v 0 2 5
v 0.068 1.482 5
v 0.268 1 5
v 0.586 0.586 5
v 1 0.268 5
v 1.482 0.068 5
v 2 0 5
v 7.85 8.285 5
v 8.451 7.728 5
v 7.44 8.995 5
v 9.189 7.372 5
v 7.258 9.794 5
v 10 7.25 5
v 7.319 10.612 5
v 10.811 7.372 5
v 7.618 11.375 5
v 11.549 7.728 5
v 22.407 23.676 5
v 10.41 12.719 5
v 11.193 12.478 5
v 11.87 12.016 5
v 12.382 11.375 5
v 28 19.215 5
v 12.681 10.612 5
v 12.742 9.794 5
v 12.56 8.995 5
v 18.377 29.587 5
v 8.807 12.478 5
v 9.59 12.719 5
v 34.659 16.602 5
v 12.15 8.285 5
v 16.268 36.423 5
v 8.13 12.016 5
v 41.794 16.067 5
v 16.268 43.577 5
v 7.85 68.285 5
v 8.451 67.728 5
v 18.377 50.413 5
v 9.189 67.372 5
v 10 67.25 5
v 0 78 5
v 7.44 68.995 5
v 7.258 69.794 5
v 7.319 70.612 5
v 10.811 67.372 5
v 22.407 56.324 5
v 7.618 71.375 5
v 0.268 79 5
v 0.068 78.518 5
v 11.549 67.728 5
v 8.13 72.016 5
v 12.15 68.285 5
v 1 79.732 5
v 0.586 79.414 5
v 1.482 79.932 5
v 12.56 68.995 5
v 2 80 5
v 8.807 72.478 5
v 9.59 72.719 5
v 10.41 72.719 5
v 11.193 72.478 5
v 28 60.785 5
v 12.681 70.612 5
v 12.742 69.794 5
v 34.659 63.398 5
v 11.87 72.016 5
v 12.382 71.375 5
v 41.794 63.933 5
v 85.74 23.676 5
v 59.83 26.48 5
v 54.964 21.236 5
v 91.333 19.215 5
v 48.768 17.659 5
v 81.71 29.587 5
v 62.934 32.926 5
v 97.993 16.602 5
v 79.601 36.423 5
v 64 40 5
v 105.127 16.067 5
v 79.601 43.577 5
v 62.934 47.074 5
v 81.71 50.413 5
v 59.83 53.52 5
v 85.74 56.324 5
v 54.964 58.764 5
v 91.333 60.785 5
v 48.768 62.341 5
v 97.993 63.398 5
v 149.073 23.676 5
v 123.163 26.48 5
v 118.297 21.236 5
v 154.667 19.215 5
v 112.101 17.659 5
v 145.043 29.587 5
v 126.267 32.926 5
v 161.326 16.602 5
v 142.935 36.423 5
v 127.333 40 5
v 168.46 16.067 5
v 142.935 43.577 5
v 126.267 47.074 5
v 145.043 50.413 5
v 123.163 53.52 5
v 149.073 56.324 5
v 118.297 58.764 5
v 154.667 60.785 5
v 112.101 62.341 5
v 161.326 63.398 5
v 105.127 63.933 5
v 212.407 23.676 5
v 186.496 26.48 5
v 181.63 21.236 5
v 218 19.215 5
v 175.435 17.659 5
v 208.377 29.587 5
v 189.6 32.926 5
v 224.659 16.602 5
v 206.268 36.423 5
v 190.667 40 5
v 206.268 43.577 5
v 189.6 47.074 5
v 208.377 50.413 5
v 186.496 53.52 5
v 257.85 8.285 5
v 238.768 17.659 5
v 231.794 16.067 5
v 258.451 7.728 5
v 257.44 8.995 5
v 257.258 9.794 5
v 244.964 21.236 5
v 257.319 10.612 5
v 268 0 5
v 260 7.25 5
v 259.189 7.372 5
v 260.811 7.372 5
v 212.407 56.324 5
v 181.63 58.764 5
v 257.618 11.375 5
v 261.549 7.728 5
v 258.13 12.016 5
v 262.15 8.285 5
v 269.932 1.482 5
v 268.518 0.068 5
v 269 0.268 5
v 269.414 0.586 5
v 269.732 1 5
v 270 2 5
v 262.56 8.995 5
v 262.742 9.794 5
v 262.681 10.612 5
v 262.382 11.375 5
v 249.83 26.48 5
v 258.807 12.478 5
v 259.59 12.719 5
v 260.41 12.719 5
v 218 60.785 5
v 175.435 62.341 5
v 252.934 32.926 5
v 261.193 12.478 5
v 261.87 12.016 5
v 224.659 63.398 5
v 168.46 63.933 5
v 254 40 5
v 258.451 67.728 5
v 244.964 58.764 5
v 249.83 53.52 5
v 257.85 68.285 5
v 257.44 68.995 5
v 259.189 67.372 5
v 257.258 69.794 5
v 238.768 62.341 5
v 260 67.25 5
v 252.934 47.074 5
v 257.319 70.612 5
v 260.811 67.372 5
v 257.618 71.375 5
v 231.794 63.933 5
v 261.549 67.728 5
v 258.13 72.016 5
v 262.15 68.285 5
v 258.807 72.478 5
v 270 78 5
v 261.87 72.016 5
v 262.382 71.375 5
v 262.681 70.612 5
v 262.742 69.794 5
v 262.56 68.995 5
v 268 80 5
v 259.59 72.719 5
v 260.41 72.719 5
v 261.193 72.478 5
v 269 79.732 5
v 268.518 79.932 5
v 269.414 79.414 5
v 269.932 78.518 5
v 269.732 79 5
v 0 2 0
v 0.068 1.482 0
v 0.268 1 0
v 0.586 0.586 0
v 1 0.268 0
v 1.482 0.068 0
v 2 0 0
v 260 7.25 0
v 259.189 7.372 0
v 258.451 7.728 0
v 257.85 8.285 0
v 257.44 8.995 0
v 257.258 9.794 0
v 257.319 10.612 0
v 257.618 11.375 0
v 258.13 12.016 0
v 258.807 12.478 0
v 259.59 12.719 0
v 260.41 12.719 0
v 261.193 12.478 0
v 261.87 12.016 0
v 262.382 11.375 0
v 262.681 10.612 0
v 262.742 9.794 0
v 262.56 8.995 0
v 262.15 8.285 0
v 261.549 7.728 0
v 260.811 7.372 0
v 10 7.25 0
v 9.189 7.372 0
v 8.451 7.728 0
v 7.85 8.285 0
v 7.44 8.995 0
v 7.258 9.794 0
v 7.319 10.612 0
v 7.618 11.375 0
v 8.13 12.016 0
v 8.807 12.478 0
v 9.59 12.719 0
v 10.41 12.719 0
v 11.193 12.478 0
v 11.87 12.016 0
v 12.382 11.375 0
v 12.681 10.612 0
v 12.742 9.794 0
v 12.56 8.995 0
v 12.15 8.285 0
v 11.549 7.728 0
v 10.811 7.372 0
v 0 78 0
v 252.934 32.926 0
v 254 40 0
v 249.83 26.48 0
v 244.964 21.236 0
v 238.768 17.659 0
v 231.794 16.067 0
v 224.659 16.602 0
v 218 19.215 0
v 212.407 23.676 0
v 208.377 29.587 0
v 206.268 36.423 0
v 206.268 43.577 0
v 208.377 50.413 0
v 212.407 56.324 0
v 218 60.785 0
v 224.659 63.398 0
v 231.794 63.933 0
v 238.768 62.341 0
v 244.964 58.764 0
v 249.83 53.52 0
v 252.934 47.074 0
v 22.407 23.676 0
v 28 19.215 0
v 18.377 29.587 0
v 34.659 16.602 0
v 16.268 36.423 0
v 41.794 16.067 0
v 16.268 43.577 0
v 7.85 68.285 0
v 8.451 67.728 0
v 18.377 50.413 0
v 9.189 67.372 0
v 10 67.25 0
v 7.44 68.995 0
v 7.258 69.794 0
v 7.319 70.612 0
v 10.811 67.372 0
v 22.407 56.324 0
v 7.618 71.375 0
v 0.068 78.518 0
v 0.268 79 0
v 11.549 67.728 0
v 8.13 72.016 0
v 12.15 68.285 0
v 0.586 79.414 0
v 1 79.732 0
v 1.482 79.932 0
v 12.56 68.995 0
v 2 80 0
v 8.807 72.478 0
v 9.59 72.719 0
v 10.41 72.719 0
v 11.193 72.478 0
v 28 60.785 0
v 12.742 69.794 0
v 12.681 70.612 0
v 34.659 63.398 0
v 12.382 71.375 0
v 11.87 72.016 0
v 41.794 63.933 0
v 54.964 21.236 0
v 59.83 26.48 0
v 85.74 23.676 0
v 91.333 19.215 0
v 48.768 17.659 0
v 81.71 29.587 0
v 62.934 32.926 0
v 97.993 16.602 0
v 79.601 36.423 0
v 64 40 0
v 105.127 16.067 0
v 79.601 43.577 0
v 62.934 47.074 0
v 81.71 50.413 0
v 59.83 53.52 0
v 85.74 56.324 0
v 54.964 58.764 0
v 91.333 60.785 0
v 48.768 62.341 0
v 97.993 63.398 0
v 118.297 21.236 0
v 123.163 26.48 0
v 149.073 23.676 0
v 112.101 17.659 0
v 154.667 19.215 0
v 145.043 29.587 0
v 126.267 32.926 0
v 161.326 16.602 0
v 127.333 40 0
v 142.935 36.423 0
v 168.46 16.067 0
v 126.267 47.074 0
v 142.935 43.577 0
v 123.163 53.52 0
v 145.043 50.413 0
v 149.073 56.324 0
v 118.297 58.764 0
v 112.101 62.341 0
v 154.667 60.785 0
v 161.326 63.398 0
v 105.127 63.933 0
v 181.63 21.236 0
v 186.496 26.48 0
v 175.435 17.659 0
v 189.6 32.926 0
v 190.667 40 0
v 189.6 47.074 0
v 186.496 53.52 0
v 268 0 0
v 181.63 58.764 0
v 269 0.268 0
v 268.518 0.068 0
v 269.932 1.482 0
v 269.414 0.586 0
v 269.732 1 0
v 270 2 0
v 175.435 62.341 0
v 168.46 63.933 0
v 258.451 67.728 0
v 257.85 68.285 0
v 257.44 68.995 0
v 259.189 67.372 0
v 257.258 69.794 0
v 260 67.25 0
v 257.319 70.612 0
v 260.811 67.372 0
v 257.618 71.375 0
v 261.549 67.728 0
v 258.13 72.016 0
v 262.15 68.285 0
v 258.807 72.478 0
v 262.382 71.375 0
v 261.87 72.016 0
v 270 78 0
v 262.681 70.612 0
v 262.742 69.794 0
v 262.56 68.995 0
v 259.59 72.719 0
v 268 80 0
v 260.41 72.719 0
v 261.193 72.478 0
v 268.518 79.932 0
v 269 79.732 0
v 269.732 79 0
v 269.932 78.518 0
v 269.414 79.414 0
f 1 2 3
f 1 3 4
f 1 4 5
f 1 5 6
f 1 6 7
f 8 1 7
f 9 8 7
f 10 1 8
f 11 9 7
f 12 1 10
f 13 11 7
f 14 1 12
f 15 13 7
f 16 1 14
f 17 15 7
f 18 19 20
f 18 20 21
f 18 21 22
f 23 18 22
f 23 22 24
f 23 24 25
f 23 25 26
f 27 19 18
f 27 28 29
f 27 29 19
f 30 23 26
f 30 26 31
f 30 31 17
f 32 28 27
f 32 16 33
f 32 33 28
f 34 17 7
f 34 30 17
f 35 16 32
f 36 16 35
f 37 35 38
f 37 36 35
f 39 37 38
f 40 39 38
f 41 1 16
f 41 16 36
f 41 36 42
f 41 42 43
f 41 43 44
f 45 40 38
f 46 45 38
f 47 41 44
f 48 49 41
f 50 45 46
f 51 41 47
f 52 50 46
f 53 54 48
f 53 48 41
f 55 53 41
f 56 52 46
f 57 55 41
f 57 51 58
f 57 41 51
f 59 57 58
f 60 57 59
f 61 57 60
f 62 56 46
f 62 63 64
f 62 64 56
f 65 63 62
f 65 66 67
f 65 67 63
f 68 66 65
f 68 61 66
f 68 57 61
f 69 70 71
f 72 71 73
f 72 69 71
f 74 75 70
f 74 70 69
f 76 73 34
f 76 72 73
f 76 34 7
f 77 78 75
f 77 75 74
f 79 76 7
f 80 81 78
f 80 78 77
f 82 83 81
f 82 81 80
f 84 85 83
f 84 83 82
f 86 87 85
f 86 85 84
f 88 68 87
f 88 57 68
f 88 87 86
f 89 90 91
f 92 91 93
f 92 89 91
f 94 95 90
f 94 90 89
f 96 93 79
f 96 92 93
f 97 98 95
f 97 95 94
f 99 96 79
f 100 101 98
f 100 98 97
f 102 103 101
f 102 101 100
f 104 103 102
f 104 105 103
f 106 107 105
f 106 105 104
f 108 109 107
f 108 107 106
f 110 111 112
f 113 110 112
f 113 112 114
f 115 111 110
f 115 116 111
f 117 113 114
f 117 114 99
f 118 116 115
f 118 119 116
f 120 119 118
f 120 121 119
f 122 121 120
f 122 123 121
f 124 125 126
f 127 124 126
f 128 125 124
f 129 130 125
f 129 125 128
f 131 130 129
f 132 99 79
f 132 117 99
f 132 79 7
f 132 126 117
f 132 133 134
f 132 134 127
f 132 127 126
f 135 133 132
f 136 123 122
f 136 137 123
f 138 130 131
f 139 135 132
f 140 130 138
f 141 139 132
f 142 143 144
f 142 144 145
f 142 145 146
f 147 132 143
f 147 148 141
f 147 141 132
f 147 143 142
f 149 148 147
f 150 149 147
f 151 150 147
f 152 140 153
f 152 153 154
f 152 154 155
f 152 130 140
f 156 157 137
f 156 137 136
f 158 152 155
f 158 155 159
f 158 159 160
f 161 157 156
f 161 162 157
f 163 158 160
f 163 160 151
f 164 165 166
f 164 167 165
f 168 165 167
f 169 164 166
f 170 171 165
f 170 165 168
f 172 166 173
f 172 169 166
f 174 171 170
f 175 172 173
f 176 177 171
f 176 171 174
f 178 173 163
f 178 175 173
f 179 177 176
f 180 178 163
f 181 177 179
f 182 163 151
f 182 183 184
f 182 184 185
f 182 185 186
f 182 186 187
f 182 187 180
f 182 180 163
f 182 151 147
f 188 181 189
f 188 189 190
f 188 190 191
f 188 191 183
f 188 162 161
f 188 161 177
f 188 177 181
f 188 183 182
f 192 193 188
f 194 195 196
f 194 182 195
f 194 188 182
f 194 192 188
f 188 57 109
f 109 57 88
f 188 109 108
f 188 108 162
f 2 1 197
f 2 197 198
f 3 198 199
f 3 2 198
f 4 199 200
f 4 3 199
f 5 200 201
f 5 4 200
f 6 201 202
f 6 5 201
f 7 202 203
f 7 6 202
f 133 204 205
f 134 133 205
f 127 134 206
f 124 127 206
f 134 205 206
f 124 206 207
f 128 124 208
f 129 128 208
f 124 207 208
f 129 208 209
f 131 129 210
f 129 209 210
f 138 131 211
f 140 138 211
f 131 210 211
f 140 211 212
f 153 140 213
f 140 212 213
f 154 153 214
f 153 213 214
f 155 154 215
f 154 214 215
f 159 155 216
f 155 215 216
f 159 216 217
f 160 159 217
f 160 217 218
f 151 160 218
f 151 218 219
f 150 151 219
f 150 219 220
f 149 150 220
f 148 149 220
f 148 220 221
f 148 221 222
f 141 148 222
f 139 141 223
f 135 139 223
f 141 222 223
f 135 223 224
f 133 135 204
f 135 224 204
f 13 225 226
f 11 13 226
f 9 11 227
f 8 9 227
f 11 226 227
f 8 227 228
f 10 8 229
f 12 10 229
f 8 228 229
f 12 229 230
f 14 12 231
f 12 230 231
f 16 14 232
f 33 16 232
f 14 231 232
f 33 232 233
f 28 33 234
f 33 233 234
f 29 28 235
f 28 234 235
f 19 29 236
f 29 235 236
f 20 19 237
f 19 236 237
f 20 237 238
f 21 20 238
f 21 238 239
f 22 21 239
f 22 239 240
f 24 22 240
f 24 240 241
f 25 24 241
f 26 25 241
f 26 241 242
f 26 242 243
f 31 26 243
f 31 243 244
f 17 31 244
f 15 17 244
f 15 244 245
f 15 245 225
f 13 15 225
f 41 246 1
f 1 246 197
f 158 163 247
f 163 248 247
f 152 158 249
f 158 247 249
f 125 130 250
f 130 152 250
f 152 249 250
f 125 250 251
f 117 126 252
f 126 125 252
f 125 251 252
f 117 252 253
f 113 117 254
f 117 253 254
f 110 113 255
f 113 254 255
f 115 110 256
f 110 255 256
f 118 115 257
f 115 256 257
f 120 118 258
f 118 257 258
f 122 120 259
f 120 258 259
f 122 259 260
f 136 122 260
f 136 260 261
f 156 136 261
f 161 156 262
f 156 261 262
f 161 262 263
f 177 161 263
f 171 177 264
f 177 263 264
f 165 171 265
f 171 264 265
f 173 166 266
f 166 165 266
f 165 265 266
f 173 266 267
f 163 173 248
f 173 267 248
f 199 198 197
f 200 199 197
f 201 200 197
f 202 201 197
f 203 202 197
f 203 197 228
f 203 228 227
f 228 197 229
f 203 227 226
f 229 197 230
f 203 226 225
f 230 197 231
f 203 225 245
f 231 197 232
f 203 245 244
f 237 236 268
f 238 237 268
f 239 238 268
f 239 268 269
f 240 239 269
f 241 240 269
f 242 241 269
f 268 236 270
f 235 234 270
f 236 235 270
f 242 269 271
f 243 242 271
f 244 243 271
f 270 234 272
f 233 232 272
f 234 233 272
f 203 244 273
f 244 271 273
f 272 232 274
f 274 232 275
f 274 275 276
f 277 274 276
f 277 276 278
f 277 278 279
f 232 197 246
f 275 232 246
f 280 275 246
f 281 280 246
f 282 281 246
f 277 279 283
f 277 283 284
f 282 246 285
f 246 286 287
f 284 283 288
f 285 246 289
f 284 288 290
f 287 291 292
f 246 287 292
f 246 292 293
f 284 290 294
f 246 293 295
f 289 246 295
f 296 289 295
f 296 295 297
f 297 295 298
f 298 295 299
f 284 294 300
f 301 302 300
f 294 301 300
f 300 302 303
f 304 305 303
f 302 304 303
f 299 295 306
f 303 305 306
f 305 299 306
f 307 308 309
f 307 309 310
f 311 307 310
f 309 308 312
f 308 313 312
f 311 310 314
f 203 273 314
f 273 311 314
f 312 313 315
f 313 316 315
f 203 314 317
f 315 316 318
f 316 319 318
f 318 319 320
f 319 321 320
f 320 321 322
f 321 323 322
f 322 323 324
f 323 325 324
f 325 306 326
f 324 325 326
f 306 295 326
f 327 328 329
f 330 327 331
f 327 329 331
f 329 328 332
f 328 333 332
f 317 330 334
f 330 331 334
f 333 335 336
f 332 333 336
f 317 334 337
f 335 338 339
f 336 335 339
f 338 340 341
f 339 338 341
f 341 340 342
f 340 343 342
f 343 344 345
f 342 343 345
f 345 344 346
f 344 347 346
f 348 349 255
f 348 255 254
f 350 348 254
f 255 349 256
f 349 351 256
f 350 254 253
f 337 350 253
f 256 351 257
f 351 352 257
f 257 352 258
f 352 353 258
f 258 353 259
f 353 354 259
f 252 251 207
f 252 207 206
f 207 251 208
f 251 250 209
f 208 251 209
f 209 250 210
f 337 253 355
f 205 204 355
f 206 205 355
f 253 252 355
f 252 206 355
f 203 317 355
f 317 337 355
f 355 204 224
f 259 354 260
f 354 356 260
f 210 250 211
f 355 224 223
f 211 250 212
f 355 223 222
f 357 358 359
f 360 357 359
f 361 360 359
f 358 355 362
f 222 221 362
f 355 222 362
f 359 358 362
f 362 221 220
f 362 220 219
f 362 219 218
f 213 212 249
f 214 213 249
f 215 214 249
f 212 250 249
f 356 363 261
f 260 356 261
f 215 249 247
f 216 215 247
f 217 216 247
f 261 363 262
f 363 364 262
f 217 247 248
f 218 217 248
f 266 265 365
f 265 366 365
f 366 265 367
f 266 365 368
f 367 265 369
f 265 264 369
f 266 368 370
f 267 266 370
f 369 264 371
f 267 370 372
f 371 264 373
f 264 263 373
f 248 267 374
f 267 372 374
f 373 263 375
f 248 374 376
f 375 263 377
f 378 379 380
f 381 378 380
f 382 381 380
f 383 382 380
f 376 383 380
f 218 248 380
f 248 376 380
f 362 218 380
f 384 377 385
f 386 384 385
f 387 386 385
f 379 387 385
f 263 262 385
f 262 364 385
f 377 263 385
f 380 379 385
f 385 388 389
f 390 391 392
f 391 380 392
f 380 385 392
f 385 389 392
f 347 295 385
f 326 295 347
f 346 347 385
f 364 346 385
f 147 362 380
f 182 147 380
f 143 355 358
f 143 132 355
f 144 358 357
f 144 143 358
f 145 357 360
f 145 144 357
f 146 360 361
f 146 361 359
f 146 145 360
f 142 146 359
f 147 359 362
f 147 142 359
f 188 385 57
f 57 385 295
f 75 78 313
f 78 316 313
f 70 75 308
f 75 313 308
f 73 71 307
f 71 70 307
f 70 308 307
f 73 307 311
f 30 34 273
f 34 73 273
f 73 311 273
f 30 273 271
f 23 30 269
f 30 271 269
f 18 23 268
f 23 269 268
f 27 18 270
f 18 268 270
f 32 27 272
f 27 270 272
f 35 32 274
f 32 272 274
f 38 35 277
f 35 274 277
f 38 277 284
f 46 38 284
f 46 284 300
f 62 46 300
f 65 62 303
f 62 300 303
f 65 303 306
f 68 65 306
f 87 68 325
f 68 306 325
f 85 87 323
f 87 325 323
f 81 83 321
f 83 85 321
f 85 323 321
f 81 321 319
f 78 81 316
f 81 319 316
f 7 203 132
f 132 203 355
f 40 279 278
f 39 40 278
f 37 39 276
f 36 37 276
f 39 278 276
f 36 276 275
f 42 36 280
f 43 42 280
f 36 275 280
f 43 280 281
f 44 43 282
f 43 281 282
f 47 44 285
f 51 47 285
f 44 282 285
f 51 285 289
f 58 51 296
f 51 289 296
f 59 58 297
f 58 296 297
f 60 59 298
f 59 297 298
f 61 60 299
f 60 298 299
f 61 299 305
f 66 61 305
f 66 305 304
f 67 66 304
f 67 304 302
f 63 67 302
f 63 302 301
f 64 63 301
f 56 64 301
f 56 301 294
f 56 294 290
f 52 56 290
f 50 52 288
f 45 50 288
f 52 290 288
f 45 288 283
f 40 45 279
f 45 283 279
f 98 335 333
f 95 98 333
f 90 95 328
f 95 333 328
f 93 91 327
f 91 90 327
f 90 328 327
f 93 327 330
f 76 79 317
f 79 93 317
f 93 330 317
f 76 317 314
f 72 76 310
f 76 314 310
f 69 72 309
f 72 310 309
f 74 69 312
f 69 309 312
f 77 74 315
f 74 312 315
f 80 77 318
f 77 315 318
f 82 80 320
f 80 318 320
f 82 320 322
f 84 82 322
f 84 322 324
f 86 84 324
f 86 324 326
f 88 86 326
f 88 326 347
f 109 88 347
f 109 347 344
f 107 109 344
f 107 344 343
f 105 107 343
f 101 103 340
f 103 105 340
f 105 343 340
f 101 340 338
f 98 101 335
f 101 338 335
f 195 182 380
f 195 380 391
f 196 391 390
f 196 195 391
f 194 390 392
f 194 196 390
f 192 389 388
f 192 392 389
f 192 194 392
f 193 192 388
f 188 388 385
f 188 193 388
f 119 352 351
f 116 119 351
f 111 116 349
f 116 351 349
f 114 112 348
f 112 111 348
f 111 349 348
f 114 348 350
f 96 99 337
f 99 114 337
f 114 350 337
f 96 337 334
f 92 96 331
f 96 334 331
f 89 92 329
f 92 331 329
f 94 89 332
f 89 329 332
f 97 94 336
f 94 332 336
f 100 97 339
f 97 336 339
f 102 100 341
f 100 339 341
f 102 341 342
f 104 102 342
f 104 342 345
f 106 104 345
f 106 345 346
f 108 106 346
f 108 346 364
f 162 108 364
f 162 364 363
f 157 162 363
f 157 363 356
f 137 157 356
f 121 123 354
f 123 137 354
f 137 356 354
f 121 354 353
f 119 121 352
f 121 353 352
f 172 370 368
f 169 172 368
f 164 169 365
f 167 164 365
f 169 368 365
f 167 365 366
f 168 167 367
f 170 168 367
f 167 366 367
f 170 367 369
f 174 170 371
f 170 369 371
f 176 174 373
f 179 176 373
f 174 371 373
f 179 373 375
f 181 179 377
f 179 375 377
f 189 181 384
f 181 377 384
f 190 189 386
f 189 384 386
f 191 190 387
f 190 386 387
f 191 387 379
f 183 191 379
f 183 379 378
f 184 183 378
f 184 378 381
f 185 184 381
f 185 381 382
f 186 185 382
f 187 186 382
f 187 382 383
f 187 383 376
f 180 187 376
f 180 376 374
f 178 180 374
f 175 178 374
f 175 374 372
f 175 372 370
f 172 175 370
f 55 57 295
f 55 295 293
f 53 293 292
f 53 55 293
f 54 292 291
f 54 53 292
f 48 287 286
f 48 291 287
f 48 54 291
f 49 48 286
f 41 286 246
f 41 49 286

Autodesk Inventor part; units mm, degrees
ref_plane "YZ Plane" through (0, 0, 0) normal (1, 0, 0) x (0, 1, 0)
ref_plane "XZ Plane" through (0, 0, 0) normal (0, 1, 0) x (-1, 0, 0)
ref_plane "XY Plane" through (0, 0, 0) normal (0, 0, 1) x (1, 0, 0)
sketch "Sketch1" plane through (0, 0, 0) normal (0, 0, 1) x (1, 0, 0)
  line L0 (0, 0) -> (270, 0)
  line L1 (270, 0) -> (270, 80)
  line L2 (270, 80) -> (0, 80)
  line L3 (0, 80) -> (0, 0)
  circle A0 centre (40, 40) radius 24
  circle A1 centre (103.3333, 40) radius 24
  circle A2 centre (166.6667, 40) radius 24
  circle A3 centre (230, 40) radius 24
  dimension "d0" = 270
  dimension "d1" = 80
  dimension "d2" = 40
  dimension "d3" = 63.3333
  dimension "d4" = 63.3333
  dimension "d5" = 63.3333
  dimension "d6" = 48
  dimension "d7" = 48
  dimension "d8" = 48
  dimension "d9" = 48
extrude "Extrusion1" add sketch "Sketch1" along normal blind 5
sketch "Sketch2" plane through (0, 0, 5) normal (0, 0, 1) x (1, 0, 0)
  circle A0 centre (10, 70) radius 2.75
  circle A1 centre (260, 70) radius 2.75
  circle A2 centre (260, 10) radius 2.75
  circle A3 centre (10, 10) radius 2.75
  line L0 (270, 80) -> (0, 80) projected
  line L1 (0, 80) -> (0, 0) projected
  line L2 (0, 0) -> (270, 0) projected
  line L3 (270, 0) -> (270, 80) projected
  dimension "d12" = 10
  dimension "d13" = 10
  dimension "d14" = 10
  dimension "d15" = 10
  dimension "d16" = 10
  dimension "d17" = 10
  dimension "d18" = 10
  dimension "d19" = 10
  dimension "d20" = 5.5
  dimension "d21" = 5.5
  dimension "d22" = 5.5
  dimension "d23" = 5.5
hole "Hole1" at (10, 70, 5) at (260, 70, 5) at (260, 10, 5) at (10, 10, 5) direction (0, 0, -1) diameter 5.5 end through all
fillet "Fillet1" radius 2 4 edges at (0, 0, 2.5) (270, 0, 2.5) (270, 80, 2.5) (0, 80, 2.5)
equation "\"d4\" = d3"
equation "\"d5\" = d3"
equation "\"d7\" = d6"
equation "\"d8\" = d6"
equation "\"d9\" = d6"
equation "\"d13\" = d12"
equation "\"d14\" = d12"
equation "\"d15\" = d12"
equation "\"d16\" = d12"
equation "\"d17\" = d12"
equation "\"d18\" = d12"
equation "\"d19\" = d12"
equation "\"d21\" = d20"
equation "\"d22\" = d20"
equation "\"d23\" = d20"
equation "\"d24\" = d20"
properties part number "TopPlates"
